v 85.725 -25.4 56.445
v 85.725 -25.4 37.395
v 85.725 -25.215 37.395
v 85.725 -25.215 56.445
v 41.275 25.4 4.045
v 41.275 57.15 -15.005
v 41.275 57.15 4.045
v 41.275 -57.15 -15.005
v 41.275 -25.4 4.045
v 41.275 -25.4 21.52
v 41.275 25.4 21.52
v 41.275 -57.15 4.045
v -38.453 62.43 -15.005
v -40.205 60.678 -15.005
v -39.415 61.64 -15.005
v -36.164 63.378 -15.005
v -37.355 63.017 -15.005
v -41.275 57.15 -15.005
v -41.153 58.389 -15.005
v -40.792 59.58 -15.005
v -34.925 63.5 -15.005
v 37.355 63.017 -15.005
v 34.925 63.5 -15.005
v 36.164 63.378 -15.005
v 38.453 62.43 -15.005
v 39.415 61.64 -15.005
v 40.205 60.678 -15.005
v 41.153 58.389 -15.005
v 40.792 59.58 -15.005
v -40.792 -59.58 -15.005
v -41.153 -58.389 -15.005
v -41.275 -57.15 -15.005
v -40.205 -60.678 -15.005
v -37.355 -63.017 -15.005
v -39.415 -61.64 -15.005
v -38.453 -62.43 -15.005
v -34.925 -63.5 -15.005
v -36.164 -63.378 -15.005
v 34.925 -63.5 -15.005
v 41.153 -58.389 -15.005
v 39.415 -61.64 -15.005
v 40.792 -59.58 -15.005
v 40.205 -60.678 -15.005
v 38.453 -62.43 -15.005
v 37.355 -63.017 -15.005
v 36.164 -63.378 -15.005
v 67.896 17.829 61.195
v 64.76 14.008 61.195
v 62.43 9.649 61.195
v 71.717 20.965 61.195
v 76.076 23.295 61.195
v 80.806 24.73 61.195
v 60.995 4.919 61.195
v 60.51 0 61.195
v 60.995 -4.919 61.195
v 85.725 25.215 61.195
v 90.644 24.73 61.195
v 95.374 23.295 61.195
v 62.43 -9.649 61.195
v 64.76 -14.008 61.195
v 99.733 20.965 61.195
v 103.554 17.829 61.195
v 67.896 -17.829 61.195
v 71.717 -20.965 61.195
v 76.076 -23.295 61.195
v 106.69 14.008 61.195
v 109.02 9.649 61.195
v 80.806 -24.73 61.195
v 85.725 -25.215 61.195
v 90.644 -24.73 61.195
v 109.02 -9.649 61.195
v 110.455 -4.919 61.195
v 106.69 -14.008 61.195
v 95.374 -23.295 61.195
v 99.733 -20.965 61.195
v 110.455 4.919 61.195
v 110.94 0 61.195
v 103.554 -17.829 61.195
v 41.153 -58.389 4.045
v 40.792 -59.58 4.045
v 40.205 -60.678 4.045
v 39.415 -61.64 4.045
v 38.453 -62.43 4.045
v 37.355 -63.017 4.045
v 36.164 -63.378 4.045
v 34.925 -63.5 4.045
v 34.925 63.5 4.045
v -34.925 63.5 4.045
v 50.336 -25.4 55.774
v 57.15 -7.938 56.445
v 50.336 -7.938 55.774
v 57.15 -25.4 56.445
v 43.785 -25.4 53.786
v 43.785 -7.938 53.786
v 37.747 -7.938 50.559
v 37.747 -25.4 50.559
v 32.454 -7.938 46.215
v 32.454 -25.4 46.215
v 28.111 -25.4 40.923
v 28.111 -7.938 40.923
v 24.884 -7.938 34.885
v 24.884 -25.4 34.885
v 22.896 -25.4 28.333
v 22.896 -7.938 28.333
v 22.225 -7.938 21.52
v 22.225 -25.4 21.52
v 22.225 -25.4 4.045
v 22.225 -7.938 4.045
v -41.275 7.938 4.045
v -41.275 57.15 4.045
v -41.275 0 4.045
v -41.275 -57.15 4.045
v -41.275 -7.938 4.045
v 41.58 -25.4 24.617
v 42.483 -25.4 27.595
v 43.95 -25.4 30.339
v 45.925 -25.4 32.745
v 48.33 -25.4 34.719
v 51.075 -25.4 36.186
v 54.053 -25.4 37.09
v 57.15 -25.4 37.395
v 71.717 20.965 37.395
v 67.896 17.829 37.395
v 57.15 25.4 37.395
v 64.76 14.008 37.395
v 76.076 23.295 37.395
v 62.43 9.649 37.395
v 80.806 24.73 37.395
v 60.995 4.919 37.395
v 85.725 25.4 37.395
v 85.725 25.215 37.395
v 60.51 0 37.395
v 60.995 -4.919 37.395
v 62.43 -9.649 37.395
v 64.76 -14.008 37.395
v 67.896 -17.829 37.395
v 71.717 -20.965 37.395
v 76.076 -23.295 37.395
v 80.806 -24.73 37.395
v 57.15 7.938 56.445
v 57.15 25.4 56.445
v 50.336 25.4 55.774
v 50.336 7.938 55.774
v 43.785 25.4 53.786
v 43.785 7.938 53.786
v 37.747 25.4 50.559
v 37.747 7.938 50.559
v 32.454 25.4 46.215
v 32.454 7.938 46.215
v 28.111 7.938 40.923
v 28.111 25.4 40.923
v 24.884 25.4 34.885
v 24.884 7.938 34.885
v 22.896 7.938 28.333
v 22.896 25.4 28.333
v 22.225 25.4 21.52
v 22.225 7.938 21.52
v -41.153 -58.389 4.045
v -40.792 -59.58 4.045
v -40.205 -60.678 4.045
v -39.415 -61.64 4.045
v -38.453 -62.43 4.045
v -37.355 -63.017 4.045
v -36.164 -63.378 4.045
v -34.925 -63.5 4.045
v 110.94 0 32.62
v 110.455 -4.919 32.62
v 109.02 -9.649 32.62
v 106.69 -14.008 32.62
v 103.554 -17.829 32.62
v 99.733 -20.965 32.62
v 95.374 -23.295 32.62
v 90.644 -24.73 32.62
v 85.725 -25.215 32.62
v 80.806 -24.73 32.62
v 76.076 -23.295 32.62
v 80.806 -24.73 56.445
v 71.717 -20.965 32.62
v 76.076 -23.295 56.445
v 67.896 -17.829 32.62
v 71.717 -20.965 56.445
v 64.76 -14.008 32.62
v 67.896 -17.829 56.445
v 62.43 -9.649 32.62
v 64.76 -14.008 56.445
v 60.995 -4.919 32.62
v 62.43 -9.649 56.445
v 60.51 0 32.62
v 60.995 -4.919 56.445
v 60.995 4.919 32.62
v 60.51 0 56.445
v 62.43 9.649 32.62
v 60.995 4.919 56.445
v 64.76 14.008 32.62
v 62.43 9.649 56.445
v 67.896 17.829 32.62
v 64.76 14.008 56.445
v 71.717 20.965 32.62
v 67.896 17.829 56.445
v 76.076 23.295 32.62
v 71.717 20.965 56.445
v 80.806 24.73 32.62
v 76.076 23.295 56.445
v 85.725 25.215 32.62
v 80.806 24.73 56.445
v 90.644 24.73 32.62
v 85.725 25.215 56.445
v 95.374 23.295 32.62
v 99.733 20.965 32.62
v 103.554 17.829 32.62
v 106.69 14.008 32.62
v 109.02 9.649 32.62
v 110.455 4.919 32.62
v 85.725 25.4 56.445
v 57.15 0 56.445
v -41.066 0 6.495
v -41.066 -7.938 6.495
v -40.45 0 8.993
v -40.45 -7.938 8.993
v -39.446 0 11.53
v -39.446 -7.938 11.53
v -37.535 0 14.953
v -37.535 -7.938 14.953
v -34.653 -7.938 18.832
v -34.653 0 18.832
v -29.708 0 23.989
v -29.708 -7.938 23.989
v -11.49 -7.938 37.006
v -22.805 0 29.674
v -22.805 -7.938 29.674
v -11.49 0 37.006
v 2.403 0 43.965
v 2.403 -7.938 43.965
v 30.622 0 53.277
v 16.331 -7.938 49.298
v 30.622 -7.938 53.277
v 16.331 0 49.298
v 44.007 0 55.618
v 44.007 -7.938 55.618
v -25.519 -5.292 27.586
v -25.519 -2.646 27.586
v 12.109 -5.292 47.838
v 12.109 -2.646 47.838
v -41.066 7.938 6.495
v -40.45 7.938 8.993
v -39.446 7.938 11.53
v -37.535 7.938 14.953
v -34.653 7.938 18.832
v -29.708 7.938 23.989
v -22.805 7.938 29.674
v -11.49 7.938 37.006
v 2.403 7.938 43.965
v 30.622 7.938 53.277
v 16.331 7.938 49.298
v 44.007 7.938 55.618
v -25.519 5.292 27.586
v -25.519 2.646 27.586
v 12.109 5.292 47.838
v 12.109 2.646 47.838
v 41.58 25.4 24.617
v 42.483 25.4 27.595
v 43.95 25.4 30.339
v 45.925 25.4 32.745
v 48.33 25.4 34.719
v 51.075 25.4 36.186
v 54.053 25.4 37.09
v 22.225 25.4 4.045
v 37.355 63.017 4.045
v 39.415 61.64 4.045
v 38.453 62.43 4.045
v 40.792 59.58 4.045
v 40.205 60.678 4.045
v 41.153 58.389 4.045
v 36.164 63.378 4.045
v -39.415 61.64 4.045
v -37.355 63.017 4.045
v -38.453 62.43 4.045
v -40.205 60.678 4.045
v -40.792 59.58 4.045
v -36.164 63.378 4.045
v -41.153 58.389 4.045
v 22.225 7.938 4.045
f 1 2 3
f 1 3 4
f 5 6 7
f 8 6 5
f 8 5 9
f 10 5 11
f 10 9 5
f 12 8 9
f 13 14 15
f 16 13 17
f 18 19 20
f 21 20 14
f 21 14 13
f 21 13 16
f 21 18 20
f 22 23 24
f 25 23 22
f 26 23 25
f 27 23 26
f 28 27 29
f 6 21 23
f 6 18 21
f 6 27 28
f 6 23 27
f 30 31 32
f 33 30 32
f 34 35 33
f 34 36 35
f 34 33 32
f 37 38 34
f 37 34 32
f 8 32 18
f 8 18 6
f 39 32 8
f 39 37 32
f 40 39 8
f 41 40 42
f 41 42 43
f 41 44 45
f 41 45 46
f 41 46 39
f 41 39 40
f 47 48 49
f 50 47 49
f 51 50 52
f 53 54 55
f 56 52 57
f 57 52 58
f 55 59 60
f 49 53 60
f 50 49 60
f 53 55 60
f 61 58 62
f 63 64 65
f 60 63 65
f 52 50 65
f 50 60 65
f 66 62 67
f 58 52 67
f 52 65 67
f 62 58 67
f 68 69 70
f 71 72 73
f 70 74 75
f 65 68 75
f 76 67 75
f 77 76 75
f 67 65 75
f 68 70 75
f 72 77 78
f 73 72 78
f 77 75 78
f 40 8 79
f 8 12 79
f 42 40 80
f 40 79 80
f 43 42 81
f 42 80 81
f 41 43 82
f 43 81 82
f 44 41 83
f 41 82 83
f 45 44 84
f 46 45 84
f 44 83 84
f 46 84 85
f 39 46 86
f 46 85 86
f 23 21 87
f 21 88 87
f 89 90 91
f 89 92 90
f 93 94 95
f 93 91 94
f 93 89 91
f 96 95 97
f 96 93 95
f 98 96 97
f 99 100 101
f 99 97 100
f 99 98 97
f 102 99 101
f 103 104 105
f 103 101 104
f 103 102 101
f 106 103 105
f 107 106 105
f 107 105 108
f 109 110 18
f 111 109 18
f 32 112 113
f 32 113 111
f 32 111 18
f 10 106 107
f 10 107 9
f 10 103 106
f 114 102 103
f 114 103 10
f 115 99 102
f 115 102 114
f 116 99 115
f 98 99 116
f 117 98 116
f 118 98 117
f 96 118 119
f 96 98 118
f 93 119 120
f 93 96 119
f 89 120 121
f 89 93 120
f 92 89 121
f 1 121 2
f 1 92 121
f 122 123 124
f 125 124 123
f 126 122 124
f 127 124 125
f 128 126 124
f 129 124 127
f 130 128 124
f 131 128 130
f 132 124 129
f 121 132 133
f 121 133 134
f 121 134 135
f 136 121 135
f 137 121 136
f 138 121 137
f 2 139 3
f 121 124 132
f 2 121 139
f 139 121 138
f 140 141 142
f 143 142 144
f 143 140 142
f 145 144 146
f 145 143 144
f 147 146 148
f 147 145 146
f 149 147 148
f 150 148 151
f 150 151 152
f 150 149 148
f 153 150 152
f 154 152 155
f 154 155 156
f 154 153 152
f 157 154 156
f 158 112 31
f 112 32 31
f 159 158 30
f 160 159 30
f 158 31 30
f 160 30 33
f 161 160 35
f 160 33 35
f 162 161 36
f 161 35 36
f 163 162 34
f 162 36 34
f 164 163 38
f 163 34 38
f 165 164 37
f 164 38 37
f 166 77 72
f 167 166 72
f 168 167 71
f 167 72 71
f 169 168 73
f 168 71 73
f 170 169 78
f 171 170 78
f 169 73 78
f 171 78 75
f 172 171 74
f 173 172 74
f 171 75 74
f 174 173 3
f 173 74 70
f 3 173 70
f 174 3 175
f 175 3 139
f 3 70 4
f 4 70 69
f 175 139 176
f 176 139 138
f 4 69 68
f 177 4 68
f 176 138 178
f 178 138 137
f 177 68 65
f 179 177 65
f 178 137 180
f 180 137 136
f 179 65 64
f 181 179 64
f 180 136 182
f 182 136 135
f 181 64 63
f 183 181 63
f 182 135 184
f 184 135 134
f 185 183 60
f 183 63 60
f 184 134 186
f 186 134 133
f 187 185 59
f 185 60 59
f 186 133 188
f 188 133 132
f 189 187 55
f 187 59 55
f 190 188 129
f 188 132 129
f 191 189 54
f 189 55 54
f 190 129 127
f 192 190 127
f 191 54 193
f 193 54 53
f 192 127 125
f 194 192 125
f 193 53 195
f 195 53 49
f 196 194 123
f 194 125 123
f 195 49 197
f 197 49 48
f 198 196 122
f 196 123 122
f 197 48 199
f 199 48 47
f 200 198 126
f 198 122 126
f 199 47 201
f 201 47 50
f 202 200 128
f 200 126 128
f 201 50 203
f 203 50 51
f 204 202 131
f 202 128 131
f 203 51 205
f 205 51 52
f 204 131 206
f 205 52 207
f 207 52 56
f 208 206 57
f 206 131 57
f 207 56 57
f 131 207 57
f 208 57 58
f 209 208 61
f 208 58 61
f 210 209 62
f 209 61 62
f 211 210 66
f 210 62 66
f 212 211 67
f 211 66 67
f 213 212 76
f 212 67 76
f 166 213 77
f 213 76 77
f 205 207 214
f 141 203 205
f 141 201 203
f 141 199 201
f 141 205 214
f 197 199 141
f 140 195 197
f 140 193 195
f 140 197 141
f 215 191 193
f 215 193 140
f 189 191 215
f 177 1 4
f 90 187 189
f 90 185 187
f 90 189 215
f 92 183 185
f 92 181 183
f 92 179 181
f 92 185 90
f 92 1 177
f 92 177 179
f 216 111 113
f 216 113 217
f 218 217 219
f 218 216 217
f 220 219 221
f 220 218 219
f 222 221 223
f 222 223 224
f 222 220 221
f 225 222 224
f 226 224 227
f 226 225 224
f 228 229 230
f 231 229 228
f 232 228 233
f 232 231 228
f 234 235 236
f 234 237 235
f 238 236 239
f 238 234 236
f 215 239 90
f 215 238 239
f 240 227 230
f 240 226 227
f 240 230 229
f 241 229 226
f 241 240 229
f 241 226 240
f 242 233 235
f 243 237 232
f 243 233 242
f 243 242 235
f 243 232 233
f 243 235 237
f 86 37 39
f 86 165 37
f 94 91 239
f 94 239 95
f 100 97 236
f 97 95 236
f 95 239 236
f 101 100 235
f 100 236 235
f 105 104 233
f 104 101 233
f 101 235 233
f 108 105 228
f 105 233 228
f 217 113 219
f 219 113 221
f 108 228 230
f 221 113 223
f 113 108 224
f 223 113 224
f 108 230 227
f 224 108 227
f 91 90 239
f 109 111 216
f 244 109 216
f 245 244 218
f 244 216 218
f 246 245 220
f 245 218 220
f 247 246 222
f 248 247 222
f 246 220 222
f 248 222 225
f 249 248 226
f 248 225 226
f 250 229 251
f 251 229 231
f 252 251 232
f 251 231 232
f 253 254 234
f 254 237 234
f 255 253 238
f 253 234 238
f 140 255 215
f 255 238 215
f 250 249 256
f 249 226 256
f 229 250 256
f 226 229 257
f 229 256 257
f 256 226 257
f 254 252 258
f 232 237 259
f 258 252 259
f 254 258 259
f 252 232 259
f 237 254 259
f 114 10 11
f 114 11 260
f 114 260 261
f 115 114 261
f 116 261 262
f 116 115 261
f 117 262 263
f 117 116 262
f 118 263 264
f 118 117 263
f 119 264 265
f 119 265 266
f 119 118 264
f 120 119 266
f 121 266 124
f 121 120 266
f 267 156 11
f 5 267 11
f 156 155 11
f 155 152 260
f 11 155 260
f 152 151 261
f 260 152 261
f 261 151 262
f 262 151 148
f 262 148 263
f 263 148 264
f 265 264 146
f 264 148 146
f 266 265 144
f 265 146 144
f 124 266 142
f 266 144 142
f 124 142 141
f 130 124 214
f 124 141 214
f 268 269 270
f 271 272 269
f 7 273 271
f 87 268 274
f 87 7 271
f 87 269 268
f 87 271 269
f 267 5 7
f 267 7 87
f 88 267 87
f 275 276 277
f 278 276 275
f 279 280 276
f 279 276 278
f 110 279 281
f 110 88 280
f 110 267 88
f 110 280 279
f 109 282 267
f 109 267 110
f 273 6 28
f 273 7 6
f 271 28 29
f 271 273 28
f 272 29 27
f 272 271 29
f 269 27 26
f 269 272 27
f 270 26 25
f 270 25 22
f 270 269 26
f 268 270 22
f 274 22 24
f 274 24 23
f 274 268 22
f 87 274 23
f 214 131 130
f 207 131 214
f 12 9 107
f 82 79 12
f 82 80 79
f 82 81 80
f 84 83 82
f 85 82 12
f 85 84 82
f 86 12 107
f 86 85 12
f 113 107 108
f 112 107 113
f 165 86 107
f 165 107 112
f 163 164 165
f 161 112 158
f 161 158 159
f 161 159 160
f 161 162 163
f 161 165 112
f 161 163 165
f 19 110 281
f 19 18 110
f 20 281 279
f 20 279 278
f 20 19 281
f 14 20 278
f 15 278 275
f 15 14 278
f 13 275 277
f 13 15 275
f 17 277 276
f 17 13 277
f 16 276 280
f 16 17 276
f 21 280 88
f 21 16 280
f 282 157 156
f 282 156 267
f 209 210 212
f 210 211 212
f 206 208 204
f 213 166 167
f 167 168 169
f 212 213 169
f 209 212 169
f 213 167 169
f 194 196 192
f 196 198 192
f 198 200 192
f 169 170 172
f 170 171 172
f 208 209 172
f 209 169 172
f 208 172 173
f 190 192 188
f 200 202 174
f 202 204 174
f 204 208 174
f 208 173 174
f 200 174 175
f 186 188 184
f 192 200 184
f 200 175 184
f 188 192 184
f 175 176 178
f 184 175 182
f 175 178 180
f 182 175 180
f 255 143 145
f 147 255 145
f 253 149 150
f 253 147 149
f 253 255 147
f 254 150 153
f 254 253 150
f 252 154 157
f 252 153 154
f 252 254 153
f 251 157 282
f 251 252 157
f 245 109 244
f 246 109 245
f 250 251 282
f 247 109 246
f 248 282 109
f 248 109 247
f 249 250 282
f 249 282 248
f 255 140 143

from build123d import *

# Parameters (mm, degrees)
F1_DEPTH = 63.5
F0_W     = 25.5854227781
F0_H     = 19.05
F2_DEPTH = 25.4
F3_DEPTH = 7.9375
F5_R     = 6.35


# Not quite as in the source:
# - a feature names something its author has since deleted; it is built from what else it names


with BuildPart() as f1:
    # F0 (on Front) → F1 (new body, symmetric)
    with BuildSketch(Plane.XZ):
        Polygon((22.225, 4.044502968), (-41.275, 4.044502968), (-41.275, -15.005497032), (41.275, -15.005497032), (41.275, 4.044502968), align=None)
    extrude(amount=F1_DEPTH, both=True)

    # F0 (on Front) → F2 (join, symmetric)
    with BuildSketch(Plane.XZ):
        with BuildLine():
            Line((22.225, 21.519702968), (22.225, 4.044502968))
            Line((22.225, 4.044502968), (41.275, 4.044502968))
            Line((41.275, 4.044502968), (41.275, 21.519702968))
            ThreePointArc((41.275, 21.519702968), (45.9246798487, 32.7450231193), (57.15, 37.394702968))
            Line((57.15, 37.394702968), (60.1395772219, 37.394702968))
            Line((60.1395772219, 37.394702968), (60.1395772219, 56.444702968))
            Line((60.1395772219, 56.444702968), (57.15, 56.444702968))
            ThreePointArc((57.15, 56.444702968), (32.4542956671, 46.2154073009), (22.225, 21.519702968))
        make_face()
        with Locations((72.9322886109, 46.919702968)):
            Rectangle(F0_W, F0_H)
    extrude(amount=F2_DEPTH, both=True)

    # F0 (on Front) → F3 (join, symmetric)
    with BuildSketch(Plane.XZ):
        with BuildLine():
            add(Edge.make_bspline(
                [(-41.275, 4.044502968), (-41.275, 26.4462009072), (13.2231097668, 56.444702968), (57.15, 56.444702968)],
                knots=[0, 0, 0, 0, 111.5045361635, 111.5045361635, 111.5045361635, 111.5045361635], degree=3))
            Line((-41.275, 4.044502968), (22.225, 4.044502968))
            Line((22.225, 4.044502968), (22.225, 21.519702968))
            ThreePointArc((22.225, 21.519702968), (32.4542956671, 46.2154073009), (57.15, 56.444702968))
        make_face()
    extrude(amount=F3_DEPTH, both=True)

    # F0 (on Front) → F4 (revolve)
    with BuildSketch(Plane.XZ):
        Polygon((85.725, 61.194502968), (85.725, 56.444702968), (85.725, 37.394702968), (85.725, 32.619502968), (110.9395772219, 32.619502968), (110.9395772219, 61.194502968), align=None)
    revolve(axis=Axis((85.725, 0, 46.907002968), (0, 0, -1)))

    # F5
    f5_edges = [f1.edges().sort_by_distance(p)[0] for p in [
        (-41.275, -63.5, -5.480497),
        (41.275, -63.5, -5.480497),
        (41.275, 63.5, -5.480497),
        (-41.275, 63.5, -5.480497),
    ]]
    fillet(f5_edges, radius=F5_R)


solid = f1.part
